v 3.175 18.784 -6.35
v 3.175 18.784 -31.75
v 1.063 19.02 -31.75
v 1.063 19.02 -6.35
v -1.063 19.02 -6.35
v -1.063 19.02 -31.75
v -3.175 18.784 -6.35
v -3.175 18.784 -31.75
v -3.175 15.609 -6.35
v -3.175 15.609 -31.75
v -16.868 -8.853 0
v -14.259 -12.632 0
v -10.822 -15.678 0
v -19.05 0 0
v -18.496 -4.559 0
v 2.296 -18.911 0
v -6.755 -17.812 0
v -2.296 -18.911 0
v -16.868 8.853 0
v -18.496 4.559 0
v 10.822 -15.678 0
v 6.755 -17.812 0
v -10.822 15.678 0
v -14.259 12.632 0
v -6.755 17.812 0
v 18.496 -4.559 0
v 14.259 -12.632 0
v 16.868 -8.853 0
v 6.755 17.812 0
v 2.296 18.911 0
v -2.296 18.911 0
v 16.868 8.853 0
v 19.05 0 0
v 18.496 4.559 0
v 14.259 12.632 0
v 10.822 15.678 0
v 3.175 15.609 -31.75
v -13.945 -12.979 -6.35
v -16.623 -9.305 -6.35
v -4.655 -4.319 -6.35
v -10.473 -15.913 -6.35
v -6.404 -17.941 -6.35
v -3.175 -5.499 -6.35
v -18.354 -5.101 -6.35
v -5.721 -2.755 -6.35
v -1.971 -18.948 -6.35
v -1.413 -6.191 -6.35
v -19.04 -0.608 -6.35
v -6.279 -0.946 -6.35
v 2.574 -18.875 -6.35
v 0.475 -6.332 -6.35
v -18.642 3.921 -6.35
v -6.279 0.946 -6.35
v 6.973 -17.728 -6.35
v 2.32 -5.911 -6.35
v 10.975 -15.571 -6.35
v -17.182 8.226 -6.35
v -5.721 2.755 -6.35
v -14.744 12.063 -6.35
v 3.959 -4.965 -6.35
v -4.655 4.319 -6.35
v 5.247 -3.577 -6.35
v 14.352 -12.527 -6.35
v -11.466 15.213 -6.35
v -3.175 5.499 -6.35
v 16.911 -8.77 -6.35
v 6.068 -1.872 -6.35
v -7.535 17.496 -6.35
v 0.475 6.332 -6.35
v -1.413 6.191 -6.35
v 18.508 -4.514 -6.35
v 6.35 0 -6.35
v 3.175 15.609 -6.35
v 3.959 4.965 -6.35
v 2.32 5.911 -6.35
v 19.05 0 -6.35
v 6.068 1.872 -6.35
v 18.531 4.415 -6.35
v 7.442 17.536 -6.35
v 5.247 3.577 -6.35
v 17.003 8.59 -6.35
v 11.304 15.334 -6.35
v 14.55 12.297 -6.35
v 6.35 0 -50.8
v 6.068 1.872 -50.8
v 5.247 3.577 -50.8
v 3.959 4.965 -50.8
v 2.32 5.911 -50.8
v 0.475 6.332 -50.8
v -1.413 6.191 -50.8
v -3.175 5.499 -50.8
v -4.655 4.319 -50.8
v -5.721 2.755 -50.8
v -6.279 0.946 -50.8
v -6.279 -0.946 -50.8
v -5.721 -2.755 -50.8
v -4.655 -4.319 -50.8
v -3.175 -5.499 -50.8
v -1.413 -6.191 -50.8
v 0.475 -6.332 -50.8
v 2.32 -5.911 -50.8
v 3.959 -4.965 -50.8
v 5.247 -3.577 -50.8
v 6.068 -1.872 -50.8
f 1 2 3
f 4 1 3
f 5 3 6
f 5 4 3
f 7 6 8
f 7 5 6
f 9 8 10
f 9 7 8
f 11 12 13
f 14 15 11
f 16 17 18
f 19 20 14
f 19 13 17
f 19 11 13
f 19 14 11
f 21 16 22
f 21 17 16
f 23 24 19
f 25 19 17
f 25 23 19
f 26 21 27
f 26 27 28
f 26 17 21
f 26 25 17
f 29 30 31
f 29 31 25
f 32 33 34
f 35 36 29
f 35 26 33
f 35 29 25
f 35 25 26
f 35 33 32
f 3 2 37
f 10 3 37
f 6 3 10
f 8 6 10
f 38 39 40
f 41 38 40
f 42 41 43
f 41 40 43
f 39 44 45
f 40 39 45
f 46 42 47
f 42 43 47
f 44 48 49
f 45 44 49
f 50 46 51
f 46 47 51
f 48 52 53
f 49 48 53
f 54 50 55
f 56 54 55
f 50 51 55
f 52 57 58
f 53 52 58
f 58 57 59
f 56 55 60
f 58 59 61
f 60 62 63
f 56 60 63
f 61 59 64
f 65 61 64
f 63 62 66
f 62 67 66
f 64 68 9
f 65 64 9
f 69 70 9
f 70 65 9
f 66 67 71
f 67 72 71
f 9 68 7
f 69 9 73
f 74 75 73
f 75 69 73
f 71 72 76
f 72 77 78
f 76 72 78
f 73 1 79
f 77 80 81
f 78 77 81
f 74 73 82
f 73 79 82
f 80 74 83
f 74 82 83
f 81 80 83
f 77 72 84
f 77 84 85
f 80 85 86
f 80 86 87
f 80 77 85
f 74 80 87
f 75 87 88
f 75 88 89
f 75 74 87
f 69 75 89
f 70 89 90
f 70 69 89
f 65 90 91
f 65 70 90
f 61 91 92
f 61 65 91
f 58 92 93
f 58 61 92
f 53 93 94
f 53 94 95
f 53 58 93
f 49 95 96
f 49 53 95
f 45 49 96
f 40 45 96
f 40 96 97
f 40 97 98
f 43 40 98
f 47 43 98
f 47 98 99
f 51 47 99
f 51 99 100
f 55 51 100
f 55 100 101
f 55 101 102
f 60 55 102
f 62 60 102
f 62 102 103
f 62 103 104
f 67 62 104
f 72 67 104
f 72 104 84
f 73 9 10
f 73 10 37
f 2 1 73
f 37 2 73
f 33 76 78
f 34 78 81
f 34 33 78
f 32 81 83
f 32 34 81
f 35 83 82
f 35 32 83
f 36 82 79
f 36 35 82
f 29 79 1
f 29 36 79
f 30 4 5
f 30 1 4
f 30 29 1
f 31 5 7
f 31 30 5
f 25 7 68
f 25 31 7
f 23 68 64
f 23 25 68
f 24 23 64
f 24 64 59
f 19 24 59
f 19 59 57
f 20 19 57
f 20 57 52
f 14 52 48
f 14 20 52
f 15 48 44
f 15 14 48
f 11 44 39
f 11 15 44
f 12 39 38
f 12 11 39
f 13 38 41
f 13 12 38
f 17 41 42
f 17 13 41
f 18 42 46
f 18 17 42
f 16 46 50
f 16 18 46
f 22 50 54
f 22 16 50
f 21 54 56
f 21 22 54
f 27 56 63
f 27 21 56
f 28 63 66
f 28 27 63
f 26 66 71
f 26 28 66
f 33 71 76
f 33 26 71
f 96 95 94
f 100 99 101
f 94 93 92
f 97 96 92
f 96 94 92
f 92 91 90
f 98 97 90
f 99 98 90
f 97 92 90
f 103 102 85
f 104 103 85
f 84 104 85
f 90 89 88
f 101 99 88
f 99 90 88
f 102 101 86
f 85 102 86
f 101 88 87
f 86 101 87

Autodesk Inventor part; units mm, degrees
ref_plane "YZ Plane" through (0, 0, 0) normal (1, 0, 0) x (0, 1, 0)
ref_plane "XZ Plane" through (0, 0, 0) normal (0, 1, 0) x (-1, 0, 0)
ref_plane "XY Plane" through (0, 0, 0) normal (0, 0, 1) x (1, 0, 0)
sketch "Sketch1" plane through (0, 0, 0) normal (0, 0, 1) x (1, 0, 0)
  circle A0 centre (0, 0) radius 6.35
  dimension "d0" = 12.7
extrude "Extrusion1" add sketch "Sketch1" against normal blind 50.8
sketch "Sketch2" plane through (0, 0, 0) normal (0, 0, 1) x (1, 0, 0)
  circle A0 centre (0, 0) radius 6.35 projected
  circle A1 centre (0, 0) radius 19.05
  dimension "d3" = 38.1
extrude "Extrusion2" add sketch "Sketch2" against normal blind 6.35
sketch "Sketch4" plane through (0, 0, -6.35) normal (0, 0, -1) x (-1, 0, 0)
  circle A0 centre (0, 0) radius 19.05 projected
  circle A1 centre (0, 0) radius 6.35 construction
  line L0 (0, 0) -> (0, 19.05) construction
  circle A2 centre (0, 0) radius 19.05 construction
  line L1 (-3.175, 18.7836) -> (-3.175, 15.6086)
  line L2 (-3.175, 15.6086) -> (0, 15.6086)
  line L3 (3.175, 18.7836) -> (3.175, 15.6086)
  line L4 (3.175, 15.6086) -> (0, 15.6086)
  arc A3 (3.175, 18.7836) -> (-3.175, 18.7836) centre (0, 0) ccw
  dimension "d6" = 3.175
  dimension "d7" = 3.175
extrude "Extrusion3" add sketch "Sketch4" along normal blind 25.4 contours L3 L4 L2 L1 A0 picked at (-1.4126, 16.7458)
properties part number "innerClutch" material "PET Plastic"
